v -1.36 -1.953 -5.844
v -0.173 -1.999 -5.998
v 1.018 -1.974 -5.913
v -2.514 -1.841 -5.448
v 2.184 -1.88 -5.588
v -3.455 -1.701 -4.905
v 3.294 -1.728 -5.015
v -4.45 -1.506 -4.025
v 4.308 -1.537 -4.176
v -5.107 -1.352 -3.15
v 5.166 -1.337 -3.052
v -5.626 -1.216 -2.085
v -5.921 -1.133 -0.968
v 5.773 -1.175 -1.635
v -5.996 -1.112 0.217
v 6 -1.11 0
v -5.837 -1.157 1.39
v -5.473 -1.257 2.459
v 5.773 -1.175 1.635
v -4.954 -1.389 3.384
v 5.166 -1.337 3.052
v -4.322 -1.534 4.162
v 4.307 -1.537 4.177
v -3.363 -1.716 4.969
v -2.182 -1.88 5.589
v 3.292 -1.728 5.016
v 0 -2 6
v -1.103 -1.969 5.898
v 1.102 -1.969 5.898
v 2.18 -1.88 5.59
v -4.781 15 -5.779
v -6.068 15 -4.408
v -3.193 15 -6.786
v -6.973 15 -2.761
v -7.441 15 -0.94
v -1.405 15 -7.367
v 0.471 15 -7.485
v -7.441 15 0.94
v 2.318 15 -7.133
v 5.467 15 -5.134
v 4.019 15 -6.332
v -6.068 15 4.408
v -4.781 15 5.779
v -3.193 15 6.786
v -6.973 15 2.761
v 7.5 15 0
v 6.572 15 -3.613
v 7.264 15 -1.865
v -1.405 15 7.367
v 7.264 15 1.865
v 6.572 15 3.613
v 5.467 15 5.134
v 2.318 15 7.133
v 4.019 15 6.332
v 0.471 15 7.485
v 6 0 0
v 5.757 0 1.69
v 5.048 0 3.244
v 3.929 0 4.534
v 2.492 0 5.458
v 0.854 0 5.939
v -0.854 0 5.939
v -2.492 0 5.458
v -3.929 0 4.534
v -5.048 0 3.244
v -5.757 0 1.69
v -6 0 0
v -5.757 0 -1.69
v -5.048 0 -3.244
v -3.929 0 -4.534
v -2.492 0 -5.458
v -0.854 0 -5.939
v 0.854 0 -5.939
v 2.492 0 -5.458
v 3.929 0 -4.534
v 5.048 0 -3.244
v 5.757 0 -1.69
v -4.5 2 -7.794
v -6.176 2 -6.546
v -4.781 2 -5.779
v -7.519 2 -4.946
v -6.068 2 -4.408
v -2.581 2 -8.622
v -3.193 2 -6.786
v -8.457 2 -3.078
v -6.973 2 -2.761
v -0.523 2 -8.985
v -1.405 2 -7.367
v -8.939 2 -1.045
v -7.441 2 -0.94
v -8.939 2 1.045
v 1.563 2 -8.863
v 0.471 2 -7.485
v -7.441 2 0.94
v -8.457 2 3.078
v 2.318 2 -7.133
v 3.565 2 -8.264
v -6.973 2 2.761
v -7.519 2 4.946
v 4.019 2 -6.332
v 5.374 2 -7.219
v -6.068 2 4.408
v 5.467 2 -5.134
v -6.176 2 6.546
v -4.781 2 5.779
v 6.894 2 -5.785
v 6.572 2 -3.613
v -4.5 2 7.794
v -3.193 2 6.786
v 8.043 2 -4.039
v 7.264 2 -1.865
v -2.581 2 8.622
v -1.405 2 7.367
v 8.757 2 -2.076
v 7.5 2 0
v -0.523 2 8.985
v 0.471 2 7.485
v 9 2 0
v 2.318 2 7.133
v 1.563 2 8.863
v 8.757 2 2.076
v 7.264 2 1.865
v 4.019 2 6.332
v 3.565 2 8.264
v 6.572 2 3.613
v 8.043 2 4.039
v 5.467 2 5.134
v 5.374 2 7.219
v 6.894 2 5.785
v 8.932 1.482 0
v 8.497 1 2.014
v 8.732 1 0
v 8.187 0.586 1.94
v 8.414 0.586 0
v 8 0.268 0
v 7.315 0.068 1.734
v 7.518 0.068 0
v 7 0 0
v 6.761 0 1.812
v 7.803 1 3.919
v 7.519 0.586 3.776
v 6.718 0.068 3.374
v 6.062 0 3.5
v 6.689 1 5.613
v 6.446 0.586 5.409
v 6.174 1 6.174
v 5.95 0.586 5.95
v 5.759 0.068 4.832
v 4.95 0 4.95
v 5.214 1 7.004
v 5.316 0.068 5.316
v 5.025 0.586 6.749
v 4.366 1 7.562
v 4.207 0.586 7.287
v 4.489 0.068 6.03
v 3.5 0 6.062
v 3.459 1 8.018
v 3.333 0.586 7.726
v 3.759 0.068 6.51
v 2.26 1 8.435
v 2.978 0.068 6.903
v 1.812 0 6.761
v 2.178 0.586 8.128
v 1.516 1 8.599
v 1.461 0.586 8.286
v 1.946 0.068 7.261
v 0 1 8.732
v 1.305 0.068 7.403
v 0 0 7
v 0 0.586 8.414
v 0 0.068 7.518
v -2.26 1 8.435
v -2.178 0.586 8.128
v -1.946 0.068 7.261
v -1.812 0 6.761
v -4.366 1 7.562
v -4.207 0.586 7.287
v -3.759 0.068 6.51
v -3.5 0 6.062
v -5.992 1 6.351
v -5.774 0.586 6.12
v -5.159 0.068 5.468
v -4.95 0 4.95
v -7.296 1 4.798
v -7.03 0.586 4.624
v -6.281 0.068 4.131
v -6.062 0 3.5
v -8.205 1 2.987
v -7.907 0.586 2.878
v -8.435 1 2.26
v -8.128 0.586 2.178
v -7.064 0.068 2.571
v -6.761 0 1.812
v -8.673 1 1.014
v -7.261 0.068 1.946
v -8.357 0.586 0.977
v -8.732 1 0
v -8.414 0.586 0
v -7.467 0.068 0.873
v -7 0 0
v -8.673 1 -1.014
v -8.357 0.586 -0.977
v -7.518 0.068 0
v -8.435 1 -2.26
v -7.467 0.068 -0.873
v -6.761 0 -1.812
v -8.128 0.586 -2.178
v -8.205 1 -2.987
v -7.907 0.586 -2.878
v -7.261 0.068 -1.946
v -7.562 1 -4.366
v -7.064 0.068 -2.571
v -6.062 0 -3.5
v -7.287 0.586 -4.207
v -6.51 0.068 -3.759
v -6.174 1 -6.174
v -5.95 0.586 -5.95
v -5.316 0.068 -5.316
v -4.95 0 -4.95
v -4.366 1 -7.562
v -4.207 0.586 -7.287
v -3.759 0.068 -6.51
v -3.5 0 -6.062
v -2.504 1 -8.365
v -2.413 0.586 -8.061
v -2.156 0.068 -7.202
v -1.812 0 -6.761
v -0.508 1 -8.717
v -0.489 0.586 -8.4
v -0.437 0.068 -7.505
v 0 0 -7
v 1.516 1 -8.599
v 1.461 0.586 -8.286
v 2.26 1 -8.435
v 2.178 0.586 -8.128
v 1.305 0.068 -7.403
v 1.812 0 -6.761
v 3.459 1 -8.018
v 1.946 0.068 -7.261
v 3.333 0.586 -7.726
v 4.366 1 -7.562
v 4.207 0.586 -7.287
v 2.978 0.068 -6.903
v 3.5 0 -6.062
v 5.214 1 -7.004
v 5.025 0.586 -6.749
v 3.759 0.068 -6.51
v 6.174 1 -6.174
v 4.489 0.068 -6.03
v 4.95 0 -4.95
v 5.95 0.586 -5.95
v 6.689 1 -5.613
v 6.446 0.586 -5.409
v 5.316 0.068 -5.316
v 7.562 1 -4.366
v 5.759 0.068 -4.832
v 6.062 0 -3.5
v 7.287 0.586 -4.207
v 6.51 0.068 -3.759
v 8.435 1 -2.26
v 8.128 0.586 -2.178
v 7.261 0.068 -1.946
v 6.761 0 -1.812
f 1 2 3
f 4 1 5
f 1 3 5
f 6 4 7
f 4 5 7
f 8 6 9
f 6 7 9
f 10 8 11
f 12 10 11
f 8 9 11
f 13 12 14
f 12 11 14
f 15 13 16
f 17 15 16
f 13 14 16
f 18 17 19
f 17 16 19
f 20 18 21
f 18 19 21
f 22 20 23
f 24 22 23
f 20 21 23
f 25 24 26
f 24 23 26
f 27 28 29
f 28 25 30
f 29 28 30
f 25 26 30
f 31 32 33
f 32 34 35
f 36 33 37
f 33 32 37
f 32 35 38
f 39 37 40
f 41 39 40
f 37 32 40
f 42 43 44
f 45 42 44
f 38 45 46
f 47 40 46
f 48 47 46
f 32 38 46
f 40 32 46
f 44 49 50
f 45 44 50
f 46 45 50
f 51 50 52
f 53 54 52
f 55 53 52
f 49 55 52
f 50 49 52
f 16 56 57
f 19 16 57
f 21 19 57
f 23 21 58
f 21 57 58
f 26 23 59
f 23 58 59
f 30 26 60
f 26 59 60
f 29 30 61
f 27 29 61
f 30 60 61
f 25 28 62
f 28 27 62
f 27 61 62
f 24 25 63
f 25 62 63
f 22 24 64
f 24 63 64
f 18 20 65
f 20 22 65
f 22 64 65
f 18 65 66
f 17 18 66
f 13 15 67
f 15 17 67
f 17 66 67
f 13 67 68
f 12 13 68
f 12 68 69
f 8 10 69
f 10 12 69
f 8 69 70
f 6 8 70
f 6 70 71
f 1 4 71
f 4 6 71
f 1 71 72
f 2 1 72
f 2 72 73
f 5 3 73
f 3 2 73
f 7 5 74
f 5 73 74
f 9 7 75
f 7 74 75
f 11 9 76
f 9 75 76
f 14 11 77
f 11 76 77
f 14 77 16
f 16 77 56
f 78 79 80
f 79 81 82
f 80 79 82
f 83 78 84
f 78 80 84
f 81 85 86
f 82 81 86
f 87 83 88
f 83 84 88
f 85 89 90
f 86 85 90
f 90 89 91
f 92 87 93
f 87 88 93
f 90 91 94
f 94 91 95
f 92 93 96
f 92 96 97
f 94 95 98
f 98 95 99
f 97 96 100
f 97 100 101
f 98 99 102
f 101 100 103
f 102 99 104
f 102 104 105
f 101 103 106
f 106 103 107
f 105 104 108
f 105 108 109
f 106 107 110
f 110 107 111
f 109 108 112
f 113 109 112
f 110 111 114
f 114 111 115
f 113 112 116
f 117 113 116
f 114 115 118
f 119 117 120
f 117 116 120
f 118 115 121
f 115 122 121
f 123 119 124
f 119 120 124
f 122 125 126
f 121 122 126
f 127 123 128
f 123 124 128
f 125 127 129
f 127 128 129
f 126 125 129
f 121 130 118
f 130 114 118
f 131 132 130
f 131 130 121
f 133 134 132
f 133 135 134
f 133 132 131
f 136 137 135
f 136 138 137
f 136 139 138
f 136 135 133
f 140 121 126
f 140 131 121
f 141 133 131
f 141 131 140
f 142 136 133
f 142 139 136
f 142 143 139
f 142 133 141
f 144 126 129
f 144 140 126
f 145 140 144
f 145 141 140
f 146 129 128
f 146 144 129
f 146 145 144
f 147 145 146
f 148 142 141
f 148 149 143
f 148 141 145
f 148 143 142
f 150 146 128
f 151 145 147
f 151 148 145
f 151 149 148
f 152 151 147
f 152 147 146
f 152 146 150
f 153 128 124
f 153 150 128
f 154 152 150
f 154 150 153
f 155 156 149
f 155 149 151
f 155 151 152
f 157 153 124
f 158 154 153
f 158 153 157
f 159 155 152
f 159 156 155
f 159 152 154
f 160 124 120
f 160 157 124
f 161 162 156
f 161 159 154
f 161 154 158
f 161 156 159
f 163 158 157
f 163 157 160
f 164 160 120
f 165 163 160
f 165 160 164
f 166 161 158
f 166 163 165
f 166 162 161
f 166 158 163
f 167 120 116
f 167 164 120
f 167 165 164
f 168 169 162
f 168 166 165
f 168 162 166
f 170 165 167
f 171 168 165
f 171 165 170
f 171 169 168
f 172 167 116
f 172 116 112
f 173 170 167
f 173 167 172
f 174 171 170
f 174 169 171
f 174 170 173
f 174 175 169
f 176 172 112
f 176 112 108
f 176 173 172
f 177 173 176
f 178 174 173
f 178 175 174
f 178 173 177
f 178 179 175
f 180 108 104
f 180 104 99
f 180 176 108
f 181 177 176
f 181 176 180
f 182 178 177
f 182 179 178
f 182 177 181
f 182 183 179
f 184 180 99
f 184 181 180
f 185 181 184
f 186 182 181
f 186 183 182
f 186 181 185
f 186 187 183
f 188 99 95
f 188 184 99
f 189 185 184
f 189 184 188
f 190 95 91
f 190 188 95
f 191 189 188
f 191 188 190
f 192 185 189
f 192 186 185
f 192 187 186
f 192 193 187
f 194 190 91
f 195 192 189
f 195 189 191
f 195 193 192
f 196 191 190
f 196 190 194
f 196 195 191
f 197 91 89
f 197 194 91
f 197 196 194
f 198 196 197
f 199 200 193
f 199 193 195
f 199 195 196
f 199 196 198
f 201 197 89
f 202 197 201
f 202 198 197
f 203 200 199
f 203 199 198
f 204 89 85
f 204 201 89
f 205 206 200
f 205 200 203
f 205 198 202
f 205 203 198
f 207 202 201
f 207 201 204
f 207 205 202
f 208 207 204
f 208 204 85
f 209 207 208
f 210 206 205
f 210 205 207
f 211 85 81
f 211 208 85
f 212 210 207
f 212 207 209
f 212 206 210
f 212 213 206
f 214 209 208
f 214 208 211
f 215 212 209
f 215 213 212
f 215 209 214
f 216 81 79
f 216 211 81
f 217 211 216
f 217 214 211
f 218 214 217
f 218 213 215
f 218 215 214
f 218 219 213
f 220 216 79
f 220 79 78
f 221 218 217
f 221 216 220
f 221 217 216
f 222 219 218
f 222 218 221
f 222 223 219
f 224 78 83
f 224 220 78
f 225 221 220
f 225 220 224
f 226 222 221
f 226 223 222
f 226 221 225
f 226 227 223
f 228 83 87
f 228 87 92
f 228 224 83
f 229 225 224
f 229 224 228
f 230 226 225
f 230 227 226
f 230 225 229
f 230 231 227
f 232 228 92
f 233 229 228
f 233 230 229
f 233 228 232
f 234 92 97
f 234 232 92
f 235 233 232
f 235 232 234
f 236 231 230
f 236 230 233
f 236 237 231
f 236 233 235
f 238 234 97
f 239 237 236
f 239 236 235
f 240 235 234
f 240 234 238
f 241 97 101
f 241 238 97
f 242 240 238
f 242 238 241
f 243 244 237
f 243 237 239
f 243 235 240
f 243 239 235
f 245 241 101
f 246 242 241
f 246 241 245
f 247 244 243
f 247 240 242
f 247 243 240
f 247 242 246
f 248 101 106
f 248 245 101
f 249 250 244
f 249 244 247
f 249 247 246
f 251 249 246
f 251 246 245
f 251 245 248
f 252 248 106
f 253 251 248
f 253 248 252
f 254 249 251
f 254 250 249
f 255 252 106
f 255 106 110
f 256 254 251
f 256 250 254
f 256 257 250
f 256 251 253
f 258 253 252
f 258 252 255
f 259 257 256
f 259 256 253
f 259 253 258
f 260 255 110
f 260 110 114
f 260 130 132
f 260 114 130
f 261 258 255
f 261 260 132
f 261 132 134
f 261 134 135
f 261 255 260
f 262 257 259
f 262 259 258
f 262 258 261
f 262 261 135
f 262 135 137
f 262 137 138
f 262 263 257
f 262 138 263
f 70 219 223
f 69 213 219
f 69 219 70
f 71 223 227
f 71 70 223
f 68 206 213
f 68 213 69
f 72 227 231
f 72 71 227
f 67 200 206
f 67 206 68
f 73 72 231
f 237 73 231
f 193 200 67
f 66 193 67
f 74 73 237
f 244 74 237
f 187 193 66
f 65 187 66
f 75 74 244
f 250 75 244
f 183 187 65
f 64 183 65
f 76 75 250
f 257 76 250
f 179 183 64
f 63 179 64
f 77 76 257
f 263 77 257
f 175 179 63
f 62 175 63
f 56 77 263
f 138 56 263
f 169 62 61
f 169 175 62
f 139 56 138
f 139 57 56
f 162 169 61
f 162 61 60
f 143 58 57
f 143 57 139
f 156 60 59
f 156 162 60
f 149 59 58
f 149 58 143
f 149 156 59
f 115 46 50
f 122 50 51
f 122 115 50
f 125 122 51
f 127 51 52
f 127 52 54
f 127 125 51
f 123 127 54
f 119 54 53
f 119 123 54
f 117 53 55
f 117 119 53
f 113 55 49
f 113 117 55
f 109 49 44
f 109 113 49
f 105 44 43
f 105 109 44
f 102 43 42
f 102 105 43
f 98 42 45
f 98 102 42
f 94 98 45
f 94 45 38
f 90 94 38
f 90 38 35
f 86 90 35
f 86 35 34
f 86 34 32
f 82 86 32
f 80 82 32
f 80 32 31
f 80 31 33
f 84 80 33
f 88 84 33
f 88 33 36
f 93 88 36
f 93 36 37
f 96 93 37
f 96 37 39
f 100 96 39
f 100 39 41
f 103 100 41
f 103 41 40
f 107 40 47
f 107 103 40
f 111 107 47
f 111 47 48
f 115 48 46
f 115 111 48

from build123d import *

# Parameters (mm, degrees)
F0_R     = 7.5
F1_DEPTH = 15
F2_R     = 9
F3_DEPTH = 2
F4_R     = 6
F5_DEPTH = 2
F7_DEPTH = 12.5
F8_R     = 1.99999


# Not quite as in the source:
# - a fillet or chamfer is up to 0.001 mm smaller than in the source, because OpenCascade refuses the exact size


with BuildPart() as f1:
    # F0 (on Front) → F1 (new body)
    with BuildSketch(Plane.XZ):
        Circle(F0_R)
    extrude(amount=-F1_DEPTH)

    # F2 (on Front) → F3 (join)
    with BuildSketch(Plane.XZ):
        Circle(F2_R)
    extrude(amount=-F3_DEPTH)

    # F4 (on Front) → F5 (join)
    with BuildSketch(Plane.XZ):
        Circle(F4_R)
    extrude(amount=F5_DEPTH)

    # F6 (on Right) → F7 (cut, symmetric)
    with BuildSketch(Plane.YZ):
        with BuildLine():
            ThreePointArc((-2, -6), (-1.1103724444, 0), (-2, 6))
            Line((-2, 6), (-2, -6))
        make_face()
    extrude(amount=F7_DEPTH, both=True, mode=Mode.SUBTRACT)

    # F8 (radius 2 in the source; OpenCascade refuses exactly that, so slightly less here)
    f8_edges = [f1.edges().sort_by_distance(p)[0] for p in [
        (-9, 0, 0),
    ]]
    fillet(f8_edges, radius=F8_R)


solid = f1.part
